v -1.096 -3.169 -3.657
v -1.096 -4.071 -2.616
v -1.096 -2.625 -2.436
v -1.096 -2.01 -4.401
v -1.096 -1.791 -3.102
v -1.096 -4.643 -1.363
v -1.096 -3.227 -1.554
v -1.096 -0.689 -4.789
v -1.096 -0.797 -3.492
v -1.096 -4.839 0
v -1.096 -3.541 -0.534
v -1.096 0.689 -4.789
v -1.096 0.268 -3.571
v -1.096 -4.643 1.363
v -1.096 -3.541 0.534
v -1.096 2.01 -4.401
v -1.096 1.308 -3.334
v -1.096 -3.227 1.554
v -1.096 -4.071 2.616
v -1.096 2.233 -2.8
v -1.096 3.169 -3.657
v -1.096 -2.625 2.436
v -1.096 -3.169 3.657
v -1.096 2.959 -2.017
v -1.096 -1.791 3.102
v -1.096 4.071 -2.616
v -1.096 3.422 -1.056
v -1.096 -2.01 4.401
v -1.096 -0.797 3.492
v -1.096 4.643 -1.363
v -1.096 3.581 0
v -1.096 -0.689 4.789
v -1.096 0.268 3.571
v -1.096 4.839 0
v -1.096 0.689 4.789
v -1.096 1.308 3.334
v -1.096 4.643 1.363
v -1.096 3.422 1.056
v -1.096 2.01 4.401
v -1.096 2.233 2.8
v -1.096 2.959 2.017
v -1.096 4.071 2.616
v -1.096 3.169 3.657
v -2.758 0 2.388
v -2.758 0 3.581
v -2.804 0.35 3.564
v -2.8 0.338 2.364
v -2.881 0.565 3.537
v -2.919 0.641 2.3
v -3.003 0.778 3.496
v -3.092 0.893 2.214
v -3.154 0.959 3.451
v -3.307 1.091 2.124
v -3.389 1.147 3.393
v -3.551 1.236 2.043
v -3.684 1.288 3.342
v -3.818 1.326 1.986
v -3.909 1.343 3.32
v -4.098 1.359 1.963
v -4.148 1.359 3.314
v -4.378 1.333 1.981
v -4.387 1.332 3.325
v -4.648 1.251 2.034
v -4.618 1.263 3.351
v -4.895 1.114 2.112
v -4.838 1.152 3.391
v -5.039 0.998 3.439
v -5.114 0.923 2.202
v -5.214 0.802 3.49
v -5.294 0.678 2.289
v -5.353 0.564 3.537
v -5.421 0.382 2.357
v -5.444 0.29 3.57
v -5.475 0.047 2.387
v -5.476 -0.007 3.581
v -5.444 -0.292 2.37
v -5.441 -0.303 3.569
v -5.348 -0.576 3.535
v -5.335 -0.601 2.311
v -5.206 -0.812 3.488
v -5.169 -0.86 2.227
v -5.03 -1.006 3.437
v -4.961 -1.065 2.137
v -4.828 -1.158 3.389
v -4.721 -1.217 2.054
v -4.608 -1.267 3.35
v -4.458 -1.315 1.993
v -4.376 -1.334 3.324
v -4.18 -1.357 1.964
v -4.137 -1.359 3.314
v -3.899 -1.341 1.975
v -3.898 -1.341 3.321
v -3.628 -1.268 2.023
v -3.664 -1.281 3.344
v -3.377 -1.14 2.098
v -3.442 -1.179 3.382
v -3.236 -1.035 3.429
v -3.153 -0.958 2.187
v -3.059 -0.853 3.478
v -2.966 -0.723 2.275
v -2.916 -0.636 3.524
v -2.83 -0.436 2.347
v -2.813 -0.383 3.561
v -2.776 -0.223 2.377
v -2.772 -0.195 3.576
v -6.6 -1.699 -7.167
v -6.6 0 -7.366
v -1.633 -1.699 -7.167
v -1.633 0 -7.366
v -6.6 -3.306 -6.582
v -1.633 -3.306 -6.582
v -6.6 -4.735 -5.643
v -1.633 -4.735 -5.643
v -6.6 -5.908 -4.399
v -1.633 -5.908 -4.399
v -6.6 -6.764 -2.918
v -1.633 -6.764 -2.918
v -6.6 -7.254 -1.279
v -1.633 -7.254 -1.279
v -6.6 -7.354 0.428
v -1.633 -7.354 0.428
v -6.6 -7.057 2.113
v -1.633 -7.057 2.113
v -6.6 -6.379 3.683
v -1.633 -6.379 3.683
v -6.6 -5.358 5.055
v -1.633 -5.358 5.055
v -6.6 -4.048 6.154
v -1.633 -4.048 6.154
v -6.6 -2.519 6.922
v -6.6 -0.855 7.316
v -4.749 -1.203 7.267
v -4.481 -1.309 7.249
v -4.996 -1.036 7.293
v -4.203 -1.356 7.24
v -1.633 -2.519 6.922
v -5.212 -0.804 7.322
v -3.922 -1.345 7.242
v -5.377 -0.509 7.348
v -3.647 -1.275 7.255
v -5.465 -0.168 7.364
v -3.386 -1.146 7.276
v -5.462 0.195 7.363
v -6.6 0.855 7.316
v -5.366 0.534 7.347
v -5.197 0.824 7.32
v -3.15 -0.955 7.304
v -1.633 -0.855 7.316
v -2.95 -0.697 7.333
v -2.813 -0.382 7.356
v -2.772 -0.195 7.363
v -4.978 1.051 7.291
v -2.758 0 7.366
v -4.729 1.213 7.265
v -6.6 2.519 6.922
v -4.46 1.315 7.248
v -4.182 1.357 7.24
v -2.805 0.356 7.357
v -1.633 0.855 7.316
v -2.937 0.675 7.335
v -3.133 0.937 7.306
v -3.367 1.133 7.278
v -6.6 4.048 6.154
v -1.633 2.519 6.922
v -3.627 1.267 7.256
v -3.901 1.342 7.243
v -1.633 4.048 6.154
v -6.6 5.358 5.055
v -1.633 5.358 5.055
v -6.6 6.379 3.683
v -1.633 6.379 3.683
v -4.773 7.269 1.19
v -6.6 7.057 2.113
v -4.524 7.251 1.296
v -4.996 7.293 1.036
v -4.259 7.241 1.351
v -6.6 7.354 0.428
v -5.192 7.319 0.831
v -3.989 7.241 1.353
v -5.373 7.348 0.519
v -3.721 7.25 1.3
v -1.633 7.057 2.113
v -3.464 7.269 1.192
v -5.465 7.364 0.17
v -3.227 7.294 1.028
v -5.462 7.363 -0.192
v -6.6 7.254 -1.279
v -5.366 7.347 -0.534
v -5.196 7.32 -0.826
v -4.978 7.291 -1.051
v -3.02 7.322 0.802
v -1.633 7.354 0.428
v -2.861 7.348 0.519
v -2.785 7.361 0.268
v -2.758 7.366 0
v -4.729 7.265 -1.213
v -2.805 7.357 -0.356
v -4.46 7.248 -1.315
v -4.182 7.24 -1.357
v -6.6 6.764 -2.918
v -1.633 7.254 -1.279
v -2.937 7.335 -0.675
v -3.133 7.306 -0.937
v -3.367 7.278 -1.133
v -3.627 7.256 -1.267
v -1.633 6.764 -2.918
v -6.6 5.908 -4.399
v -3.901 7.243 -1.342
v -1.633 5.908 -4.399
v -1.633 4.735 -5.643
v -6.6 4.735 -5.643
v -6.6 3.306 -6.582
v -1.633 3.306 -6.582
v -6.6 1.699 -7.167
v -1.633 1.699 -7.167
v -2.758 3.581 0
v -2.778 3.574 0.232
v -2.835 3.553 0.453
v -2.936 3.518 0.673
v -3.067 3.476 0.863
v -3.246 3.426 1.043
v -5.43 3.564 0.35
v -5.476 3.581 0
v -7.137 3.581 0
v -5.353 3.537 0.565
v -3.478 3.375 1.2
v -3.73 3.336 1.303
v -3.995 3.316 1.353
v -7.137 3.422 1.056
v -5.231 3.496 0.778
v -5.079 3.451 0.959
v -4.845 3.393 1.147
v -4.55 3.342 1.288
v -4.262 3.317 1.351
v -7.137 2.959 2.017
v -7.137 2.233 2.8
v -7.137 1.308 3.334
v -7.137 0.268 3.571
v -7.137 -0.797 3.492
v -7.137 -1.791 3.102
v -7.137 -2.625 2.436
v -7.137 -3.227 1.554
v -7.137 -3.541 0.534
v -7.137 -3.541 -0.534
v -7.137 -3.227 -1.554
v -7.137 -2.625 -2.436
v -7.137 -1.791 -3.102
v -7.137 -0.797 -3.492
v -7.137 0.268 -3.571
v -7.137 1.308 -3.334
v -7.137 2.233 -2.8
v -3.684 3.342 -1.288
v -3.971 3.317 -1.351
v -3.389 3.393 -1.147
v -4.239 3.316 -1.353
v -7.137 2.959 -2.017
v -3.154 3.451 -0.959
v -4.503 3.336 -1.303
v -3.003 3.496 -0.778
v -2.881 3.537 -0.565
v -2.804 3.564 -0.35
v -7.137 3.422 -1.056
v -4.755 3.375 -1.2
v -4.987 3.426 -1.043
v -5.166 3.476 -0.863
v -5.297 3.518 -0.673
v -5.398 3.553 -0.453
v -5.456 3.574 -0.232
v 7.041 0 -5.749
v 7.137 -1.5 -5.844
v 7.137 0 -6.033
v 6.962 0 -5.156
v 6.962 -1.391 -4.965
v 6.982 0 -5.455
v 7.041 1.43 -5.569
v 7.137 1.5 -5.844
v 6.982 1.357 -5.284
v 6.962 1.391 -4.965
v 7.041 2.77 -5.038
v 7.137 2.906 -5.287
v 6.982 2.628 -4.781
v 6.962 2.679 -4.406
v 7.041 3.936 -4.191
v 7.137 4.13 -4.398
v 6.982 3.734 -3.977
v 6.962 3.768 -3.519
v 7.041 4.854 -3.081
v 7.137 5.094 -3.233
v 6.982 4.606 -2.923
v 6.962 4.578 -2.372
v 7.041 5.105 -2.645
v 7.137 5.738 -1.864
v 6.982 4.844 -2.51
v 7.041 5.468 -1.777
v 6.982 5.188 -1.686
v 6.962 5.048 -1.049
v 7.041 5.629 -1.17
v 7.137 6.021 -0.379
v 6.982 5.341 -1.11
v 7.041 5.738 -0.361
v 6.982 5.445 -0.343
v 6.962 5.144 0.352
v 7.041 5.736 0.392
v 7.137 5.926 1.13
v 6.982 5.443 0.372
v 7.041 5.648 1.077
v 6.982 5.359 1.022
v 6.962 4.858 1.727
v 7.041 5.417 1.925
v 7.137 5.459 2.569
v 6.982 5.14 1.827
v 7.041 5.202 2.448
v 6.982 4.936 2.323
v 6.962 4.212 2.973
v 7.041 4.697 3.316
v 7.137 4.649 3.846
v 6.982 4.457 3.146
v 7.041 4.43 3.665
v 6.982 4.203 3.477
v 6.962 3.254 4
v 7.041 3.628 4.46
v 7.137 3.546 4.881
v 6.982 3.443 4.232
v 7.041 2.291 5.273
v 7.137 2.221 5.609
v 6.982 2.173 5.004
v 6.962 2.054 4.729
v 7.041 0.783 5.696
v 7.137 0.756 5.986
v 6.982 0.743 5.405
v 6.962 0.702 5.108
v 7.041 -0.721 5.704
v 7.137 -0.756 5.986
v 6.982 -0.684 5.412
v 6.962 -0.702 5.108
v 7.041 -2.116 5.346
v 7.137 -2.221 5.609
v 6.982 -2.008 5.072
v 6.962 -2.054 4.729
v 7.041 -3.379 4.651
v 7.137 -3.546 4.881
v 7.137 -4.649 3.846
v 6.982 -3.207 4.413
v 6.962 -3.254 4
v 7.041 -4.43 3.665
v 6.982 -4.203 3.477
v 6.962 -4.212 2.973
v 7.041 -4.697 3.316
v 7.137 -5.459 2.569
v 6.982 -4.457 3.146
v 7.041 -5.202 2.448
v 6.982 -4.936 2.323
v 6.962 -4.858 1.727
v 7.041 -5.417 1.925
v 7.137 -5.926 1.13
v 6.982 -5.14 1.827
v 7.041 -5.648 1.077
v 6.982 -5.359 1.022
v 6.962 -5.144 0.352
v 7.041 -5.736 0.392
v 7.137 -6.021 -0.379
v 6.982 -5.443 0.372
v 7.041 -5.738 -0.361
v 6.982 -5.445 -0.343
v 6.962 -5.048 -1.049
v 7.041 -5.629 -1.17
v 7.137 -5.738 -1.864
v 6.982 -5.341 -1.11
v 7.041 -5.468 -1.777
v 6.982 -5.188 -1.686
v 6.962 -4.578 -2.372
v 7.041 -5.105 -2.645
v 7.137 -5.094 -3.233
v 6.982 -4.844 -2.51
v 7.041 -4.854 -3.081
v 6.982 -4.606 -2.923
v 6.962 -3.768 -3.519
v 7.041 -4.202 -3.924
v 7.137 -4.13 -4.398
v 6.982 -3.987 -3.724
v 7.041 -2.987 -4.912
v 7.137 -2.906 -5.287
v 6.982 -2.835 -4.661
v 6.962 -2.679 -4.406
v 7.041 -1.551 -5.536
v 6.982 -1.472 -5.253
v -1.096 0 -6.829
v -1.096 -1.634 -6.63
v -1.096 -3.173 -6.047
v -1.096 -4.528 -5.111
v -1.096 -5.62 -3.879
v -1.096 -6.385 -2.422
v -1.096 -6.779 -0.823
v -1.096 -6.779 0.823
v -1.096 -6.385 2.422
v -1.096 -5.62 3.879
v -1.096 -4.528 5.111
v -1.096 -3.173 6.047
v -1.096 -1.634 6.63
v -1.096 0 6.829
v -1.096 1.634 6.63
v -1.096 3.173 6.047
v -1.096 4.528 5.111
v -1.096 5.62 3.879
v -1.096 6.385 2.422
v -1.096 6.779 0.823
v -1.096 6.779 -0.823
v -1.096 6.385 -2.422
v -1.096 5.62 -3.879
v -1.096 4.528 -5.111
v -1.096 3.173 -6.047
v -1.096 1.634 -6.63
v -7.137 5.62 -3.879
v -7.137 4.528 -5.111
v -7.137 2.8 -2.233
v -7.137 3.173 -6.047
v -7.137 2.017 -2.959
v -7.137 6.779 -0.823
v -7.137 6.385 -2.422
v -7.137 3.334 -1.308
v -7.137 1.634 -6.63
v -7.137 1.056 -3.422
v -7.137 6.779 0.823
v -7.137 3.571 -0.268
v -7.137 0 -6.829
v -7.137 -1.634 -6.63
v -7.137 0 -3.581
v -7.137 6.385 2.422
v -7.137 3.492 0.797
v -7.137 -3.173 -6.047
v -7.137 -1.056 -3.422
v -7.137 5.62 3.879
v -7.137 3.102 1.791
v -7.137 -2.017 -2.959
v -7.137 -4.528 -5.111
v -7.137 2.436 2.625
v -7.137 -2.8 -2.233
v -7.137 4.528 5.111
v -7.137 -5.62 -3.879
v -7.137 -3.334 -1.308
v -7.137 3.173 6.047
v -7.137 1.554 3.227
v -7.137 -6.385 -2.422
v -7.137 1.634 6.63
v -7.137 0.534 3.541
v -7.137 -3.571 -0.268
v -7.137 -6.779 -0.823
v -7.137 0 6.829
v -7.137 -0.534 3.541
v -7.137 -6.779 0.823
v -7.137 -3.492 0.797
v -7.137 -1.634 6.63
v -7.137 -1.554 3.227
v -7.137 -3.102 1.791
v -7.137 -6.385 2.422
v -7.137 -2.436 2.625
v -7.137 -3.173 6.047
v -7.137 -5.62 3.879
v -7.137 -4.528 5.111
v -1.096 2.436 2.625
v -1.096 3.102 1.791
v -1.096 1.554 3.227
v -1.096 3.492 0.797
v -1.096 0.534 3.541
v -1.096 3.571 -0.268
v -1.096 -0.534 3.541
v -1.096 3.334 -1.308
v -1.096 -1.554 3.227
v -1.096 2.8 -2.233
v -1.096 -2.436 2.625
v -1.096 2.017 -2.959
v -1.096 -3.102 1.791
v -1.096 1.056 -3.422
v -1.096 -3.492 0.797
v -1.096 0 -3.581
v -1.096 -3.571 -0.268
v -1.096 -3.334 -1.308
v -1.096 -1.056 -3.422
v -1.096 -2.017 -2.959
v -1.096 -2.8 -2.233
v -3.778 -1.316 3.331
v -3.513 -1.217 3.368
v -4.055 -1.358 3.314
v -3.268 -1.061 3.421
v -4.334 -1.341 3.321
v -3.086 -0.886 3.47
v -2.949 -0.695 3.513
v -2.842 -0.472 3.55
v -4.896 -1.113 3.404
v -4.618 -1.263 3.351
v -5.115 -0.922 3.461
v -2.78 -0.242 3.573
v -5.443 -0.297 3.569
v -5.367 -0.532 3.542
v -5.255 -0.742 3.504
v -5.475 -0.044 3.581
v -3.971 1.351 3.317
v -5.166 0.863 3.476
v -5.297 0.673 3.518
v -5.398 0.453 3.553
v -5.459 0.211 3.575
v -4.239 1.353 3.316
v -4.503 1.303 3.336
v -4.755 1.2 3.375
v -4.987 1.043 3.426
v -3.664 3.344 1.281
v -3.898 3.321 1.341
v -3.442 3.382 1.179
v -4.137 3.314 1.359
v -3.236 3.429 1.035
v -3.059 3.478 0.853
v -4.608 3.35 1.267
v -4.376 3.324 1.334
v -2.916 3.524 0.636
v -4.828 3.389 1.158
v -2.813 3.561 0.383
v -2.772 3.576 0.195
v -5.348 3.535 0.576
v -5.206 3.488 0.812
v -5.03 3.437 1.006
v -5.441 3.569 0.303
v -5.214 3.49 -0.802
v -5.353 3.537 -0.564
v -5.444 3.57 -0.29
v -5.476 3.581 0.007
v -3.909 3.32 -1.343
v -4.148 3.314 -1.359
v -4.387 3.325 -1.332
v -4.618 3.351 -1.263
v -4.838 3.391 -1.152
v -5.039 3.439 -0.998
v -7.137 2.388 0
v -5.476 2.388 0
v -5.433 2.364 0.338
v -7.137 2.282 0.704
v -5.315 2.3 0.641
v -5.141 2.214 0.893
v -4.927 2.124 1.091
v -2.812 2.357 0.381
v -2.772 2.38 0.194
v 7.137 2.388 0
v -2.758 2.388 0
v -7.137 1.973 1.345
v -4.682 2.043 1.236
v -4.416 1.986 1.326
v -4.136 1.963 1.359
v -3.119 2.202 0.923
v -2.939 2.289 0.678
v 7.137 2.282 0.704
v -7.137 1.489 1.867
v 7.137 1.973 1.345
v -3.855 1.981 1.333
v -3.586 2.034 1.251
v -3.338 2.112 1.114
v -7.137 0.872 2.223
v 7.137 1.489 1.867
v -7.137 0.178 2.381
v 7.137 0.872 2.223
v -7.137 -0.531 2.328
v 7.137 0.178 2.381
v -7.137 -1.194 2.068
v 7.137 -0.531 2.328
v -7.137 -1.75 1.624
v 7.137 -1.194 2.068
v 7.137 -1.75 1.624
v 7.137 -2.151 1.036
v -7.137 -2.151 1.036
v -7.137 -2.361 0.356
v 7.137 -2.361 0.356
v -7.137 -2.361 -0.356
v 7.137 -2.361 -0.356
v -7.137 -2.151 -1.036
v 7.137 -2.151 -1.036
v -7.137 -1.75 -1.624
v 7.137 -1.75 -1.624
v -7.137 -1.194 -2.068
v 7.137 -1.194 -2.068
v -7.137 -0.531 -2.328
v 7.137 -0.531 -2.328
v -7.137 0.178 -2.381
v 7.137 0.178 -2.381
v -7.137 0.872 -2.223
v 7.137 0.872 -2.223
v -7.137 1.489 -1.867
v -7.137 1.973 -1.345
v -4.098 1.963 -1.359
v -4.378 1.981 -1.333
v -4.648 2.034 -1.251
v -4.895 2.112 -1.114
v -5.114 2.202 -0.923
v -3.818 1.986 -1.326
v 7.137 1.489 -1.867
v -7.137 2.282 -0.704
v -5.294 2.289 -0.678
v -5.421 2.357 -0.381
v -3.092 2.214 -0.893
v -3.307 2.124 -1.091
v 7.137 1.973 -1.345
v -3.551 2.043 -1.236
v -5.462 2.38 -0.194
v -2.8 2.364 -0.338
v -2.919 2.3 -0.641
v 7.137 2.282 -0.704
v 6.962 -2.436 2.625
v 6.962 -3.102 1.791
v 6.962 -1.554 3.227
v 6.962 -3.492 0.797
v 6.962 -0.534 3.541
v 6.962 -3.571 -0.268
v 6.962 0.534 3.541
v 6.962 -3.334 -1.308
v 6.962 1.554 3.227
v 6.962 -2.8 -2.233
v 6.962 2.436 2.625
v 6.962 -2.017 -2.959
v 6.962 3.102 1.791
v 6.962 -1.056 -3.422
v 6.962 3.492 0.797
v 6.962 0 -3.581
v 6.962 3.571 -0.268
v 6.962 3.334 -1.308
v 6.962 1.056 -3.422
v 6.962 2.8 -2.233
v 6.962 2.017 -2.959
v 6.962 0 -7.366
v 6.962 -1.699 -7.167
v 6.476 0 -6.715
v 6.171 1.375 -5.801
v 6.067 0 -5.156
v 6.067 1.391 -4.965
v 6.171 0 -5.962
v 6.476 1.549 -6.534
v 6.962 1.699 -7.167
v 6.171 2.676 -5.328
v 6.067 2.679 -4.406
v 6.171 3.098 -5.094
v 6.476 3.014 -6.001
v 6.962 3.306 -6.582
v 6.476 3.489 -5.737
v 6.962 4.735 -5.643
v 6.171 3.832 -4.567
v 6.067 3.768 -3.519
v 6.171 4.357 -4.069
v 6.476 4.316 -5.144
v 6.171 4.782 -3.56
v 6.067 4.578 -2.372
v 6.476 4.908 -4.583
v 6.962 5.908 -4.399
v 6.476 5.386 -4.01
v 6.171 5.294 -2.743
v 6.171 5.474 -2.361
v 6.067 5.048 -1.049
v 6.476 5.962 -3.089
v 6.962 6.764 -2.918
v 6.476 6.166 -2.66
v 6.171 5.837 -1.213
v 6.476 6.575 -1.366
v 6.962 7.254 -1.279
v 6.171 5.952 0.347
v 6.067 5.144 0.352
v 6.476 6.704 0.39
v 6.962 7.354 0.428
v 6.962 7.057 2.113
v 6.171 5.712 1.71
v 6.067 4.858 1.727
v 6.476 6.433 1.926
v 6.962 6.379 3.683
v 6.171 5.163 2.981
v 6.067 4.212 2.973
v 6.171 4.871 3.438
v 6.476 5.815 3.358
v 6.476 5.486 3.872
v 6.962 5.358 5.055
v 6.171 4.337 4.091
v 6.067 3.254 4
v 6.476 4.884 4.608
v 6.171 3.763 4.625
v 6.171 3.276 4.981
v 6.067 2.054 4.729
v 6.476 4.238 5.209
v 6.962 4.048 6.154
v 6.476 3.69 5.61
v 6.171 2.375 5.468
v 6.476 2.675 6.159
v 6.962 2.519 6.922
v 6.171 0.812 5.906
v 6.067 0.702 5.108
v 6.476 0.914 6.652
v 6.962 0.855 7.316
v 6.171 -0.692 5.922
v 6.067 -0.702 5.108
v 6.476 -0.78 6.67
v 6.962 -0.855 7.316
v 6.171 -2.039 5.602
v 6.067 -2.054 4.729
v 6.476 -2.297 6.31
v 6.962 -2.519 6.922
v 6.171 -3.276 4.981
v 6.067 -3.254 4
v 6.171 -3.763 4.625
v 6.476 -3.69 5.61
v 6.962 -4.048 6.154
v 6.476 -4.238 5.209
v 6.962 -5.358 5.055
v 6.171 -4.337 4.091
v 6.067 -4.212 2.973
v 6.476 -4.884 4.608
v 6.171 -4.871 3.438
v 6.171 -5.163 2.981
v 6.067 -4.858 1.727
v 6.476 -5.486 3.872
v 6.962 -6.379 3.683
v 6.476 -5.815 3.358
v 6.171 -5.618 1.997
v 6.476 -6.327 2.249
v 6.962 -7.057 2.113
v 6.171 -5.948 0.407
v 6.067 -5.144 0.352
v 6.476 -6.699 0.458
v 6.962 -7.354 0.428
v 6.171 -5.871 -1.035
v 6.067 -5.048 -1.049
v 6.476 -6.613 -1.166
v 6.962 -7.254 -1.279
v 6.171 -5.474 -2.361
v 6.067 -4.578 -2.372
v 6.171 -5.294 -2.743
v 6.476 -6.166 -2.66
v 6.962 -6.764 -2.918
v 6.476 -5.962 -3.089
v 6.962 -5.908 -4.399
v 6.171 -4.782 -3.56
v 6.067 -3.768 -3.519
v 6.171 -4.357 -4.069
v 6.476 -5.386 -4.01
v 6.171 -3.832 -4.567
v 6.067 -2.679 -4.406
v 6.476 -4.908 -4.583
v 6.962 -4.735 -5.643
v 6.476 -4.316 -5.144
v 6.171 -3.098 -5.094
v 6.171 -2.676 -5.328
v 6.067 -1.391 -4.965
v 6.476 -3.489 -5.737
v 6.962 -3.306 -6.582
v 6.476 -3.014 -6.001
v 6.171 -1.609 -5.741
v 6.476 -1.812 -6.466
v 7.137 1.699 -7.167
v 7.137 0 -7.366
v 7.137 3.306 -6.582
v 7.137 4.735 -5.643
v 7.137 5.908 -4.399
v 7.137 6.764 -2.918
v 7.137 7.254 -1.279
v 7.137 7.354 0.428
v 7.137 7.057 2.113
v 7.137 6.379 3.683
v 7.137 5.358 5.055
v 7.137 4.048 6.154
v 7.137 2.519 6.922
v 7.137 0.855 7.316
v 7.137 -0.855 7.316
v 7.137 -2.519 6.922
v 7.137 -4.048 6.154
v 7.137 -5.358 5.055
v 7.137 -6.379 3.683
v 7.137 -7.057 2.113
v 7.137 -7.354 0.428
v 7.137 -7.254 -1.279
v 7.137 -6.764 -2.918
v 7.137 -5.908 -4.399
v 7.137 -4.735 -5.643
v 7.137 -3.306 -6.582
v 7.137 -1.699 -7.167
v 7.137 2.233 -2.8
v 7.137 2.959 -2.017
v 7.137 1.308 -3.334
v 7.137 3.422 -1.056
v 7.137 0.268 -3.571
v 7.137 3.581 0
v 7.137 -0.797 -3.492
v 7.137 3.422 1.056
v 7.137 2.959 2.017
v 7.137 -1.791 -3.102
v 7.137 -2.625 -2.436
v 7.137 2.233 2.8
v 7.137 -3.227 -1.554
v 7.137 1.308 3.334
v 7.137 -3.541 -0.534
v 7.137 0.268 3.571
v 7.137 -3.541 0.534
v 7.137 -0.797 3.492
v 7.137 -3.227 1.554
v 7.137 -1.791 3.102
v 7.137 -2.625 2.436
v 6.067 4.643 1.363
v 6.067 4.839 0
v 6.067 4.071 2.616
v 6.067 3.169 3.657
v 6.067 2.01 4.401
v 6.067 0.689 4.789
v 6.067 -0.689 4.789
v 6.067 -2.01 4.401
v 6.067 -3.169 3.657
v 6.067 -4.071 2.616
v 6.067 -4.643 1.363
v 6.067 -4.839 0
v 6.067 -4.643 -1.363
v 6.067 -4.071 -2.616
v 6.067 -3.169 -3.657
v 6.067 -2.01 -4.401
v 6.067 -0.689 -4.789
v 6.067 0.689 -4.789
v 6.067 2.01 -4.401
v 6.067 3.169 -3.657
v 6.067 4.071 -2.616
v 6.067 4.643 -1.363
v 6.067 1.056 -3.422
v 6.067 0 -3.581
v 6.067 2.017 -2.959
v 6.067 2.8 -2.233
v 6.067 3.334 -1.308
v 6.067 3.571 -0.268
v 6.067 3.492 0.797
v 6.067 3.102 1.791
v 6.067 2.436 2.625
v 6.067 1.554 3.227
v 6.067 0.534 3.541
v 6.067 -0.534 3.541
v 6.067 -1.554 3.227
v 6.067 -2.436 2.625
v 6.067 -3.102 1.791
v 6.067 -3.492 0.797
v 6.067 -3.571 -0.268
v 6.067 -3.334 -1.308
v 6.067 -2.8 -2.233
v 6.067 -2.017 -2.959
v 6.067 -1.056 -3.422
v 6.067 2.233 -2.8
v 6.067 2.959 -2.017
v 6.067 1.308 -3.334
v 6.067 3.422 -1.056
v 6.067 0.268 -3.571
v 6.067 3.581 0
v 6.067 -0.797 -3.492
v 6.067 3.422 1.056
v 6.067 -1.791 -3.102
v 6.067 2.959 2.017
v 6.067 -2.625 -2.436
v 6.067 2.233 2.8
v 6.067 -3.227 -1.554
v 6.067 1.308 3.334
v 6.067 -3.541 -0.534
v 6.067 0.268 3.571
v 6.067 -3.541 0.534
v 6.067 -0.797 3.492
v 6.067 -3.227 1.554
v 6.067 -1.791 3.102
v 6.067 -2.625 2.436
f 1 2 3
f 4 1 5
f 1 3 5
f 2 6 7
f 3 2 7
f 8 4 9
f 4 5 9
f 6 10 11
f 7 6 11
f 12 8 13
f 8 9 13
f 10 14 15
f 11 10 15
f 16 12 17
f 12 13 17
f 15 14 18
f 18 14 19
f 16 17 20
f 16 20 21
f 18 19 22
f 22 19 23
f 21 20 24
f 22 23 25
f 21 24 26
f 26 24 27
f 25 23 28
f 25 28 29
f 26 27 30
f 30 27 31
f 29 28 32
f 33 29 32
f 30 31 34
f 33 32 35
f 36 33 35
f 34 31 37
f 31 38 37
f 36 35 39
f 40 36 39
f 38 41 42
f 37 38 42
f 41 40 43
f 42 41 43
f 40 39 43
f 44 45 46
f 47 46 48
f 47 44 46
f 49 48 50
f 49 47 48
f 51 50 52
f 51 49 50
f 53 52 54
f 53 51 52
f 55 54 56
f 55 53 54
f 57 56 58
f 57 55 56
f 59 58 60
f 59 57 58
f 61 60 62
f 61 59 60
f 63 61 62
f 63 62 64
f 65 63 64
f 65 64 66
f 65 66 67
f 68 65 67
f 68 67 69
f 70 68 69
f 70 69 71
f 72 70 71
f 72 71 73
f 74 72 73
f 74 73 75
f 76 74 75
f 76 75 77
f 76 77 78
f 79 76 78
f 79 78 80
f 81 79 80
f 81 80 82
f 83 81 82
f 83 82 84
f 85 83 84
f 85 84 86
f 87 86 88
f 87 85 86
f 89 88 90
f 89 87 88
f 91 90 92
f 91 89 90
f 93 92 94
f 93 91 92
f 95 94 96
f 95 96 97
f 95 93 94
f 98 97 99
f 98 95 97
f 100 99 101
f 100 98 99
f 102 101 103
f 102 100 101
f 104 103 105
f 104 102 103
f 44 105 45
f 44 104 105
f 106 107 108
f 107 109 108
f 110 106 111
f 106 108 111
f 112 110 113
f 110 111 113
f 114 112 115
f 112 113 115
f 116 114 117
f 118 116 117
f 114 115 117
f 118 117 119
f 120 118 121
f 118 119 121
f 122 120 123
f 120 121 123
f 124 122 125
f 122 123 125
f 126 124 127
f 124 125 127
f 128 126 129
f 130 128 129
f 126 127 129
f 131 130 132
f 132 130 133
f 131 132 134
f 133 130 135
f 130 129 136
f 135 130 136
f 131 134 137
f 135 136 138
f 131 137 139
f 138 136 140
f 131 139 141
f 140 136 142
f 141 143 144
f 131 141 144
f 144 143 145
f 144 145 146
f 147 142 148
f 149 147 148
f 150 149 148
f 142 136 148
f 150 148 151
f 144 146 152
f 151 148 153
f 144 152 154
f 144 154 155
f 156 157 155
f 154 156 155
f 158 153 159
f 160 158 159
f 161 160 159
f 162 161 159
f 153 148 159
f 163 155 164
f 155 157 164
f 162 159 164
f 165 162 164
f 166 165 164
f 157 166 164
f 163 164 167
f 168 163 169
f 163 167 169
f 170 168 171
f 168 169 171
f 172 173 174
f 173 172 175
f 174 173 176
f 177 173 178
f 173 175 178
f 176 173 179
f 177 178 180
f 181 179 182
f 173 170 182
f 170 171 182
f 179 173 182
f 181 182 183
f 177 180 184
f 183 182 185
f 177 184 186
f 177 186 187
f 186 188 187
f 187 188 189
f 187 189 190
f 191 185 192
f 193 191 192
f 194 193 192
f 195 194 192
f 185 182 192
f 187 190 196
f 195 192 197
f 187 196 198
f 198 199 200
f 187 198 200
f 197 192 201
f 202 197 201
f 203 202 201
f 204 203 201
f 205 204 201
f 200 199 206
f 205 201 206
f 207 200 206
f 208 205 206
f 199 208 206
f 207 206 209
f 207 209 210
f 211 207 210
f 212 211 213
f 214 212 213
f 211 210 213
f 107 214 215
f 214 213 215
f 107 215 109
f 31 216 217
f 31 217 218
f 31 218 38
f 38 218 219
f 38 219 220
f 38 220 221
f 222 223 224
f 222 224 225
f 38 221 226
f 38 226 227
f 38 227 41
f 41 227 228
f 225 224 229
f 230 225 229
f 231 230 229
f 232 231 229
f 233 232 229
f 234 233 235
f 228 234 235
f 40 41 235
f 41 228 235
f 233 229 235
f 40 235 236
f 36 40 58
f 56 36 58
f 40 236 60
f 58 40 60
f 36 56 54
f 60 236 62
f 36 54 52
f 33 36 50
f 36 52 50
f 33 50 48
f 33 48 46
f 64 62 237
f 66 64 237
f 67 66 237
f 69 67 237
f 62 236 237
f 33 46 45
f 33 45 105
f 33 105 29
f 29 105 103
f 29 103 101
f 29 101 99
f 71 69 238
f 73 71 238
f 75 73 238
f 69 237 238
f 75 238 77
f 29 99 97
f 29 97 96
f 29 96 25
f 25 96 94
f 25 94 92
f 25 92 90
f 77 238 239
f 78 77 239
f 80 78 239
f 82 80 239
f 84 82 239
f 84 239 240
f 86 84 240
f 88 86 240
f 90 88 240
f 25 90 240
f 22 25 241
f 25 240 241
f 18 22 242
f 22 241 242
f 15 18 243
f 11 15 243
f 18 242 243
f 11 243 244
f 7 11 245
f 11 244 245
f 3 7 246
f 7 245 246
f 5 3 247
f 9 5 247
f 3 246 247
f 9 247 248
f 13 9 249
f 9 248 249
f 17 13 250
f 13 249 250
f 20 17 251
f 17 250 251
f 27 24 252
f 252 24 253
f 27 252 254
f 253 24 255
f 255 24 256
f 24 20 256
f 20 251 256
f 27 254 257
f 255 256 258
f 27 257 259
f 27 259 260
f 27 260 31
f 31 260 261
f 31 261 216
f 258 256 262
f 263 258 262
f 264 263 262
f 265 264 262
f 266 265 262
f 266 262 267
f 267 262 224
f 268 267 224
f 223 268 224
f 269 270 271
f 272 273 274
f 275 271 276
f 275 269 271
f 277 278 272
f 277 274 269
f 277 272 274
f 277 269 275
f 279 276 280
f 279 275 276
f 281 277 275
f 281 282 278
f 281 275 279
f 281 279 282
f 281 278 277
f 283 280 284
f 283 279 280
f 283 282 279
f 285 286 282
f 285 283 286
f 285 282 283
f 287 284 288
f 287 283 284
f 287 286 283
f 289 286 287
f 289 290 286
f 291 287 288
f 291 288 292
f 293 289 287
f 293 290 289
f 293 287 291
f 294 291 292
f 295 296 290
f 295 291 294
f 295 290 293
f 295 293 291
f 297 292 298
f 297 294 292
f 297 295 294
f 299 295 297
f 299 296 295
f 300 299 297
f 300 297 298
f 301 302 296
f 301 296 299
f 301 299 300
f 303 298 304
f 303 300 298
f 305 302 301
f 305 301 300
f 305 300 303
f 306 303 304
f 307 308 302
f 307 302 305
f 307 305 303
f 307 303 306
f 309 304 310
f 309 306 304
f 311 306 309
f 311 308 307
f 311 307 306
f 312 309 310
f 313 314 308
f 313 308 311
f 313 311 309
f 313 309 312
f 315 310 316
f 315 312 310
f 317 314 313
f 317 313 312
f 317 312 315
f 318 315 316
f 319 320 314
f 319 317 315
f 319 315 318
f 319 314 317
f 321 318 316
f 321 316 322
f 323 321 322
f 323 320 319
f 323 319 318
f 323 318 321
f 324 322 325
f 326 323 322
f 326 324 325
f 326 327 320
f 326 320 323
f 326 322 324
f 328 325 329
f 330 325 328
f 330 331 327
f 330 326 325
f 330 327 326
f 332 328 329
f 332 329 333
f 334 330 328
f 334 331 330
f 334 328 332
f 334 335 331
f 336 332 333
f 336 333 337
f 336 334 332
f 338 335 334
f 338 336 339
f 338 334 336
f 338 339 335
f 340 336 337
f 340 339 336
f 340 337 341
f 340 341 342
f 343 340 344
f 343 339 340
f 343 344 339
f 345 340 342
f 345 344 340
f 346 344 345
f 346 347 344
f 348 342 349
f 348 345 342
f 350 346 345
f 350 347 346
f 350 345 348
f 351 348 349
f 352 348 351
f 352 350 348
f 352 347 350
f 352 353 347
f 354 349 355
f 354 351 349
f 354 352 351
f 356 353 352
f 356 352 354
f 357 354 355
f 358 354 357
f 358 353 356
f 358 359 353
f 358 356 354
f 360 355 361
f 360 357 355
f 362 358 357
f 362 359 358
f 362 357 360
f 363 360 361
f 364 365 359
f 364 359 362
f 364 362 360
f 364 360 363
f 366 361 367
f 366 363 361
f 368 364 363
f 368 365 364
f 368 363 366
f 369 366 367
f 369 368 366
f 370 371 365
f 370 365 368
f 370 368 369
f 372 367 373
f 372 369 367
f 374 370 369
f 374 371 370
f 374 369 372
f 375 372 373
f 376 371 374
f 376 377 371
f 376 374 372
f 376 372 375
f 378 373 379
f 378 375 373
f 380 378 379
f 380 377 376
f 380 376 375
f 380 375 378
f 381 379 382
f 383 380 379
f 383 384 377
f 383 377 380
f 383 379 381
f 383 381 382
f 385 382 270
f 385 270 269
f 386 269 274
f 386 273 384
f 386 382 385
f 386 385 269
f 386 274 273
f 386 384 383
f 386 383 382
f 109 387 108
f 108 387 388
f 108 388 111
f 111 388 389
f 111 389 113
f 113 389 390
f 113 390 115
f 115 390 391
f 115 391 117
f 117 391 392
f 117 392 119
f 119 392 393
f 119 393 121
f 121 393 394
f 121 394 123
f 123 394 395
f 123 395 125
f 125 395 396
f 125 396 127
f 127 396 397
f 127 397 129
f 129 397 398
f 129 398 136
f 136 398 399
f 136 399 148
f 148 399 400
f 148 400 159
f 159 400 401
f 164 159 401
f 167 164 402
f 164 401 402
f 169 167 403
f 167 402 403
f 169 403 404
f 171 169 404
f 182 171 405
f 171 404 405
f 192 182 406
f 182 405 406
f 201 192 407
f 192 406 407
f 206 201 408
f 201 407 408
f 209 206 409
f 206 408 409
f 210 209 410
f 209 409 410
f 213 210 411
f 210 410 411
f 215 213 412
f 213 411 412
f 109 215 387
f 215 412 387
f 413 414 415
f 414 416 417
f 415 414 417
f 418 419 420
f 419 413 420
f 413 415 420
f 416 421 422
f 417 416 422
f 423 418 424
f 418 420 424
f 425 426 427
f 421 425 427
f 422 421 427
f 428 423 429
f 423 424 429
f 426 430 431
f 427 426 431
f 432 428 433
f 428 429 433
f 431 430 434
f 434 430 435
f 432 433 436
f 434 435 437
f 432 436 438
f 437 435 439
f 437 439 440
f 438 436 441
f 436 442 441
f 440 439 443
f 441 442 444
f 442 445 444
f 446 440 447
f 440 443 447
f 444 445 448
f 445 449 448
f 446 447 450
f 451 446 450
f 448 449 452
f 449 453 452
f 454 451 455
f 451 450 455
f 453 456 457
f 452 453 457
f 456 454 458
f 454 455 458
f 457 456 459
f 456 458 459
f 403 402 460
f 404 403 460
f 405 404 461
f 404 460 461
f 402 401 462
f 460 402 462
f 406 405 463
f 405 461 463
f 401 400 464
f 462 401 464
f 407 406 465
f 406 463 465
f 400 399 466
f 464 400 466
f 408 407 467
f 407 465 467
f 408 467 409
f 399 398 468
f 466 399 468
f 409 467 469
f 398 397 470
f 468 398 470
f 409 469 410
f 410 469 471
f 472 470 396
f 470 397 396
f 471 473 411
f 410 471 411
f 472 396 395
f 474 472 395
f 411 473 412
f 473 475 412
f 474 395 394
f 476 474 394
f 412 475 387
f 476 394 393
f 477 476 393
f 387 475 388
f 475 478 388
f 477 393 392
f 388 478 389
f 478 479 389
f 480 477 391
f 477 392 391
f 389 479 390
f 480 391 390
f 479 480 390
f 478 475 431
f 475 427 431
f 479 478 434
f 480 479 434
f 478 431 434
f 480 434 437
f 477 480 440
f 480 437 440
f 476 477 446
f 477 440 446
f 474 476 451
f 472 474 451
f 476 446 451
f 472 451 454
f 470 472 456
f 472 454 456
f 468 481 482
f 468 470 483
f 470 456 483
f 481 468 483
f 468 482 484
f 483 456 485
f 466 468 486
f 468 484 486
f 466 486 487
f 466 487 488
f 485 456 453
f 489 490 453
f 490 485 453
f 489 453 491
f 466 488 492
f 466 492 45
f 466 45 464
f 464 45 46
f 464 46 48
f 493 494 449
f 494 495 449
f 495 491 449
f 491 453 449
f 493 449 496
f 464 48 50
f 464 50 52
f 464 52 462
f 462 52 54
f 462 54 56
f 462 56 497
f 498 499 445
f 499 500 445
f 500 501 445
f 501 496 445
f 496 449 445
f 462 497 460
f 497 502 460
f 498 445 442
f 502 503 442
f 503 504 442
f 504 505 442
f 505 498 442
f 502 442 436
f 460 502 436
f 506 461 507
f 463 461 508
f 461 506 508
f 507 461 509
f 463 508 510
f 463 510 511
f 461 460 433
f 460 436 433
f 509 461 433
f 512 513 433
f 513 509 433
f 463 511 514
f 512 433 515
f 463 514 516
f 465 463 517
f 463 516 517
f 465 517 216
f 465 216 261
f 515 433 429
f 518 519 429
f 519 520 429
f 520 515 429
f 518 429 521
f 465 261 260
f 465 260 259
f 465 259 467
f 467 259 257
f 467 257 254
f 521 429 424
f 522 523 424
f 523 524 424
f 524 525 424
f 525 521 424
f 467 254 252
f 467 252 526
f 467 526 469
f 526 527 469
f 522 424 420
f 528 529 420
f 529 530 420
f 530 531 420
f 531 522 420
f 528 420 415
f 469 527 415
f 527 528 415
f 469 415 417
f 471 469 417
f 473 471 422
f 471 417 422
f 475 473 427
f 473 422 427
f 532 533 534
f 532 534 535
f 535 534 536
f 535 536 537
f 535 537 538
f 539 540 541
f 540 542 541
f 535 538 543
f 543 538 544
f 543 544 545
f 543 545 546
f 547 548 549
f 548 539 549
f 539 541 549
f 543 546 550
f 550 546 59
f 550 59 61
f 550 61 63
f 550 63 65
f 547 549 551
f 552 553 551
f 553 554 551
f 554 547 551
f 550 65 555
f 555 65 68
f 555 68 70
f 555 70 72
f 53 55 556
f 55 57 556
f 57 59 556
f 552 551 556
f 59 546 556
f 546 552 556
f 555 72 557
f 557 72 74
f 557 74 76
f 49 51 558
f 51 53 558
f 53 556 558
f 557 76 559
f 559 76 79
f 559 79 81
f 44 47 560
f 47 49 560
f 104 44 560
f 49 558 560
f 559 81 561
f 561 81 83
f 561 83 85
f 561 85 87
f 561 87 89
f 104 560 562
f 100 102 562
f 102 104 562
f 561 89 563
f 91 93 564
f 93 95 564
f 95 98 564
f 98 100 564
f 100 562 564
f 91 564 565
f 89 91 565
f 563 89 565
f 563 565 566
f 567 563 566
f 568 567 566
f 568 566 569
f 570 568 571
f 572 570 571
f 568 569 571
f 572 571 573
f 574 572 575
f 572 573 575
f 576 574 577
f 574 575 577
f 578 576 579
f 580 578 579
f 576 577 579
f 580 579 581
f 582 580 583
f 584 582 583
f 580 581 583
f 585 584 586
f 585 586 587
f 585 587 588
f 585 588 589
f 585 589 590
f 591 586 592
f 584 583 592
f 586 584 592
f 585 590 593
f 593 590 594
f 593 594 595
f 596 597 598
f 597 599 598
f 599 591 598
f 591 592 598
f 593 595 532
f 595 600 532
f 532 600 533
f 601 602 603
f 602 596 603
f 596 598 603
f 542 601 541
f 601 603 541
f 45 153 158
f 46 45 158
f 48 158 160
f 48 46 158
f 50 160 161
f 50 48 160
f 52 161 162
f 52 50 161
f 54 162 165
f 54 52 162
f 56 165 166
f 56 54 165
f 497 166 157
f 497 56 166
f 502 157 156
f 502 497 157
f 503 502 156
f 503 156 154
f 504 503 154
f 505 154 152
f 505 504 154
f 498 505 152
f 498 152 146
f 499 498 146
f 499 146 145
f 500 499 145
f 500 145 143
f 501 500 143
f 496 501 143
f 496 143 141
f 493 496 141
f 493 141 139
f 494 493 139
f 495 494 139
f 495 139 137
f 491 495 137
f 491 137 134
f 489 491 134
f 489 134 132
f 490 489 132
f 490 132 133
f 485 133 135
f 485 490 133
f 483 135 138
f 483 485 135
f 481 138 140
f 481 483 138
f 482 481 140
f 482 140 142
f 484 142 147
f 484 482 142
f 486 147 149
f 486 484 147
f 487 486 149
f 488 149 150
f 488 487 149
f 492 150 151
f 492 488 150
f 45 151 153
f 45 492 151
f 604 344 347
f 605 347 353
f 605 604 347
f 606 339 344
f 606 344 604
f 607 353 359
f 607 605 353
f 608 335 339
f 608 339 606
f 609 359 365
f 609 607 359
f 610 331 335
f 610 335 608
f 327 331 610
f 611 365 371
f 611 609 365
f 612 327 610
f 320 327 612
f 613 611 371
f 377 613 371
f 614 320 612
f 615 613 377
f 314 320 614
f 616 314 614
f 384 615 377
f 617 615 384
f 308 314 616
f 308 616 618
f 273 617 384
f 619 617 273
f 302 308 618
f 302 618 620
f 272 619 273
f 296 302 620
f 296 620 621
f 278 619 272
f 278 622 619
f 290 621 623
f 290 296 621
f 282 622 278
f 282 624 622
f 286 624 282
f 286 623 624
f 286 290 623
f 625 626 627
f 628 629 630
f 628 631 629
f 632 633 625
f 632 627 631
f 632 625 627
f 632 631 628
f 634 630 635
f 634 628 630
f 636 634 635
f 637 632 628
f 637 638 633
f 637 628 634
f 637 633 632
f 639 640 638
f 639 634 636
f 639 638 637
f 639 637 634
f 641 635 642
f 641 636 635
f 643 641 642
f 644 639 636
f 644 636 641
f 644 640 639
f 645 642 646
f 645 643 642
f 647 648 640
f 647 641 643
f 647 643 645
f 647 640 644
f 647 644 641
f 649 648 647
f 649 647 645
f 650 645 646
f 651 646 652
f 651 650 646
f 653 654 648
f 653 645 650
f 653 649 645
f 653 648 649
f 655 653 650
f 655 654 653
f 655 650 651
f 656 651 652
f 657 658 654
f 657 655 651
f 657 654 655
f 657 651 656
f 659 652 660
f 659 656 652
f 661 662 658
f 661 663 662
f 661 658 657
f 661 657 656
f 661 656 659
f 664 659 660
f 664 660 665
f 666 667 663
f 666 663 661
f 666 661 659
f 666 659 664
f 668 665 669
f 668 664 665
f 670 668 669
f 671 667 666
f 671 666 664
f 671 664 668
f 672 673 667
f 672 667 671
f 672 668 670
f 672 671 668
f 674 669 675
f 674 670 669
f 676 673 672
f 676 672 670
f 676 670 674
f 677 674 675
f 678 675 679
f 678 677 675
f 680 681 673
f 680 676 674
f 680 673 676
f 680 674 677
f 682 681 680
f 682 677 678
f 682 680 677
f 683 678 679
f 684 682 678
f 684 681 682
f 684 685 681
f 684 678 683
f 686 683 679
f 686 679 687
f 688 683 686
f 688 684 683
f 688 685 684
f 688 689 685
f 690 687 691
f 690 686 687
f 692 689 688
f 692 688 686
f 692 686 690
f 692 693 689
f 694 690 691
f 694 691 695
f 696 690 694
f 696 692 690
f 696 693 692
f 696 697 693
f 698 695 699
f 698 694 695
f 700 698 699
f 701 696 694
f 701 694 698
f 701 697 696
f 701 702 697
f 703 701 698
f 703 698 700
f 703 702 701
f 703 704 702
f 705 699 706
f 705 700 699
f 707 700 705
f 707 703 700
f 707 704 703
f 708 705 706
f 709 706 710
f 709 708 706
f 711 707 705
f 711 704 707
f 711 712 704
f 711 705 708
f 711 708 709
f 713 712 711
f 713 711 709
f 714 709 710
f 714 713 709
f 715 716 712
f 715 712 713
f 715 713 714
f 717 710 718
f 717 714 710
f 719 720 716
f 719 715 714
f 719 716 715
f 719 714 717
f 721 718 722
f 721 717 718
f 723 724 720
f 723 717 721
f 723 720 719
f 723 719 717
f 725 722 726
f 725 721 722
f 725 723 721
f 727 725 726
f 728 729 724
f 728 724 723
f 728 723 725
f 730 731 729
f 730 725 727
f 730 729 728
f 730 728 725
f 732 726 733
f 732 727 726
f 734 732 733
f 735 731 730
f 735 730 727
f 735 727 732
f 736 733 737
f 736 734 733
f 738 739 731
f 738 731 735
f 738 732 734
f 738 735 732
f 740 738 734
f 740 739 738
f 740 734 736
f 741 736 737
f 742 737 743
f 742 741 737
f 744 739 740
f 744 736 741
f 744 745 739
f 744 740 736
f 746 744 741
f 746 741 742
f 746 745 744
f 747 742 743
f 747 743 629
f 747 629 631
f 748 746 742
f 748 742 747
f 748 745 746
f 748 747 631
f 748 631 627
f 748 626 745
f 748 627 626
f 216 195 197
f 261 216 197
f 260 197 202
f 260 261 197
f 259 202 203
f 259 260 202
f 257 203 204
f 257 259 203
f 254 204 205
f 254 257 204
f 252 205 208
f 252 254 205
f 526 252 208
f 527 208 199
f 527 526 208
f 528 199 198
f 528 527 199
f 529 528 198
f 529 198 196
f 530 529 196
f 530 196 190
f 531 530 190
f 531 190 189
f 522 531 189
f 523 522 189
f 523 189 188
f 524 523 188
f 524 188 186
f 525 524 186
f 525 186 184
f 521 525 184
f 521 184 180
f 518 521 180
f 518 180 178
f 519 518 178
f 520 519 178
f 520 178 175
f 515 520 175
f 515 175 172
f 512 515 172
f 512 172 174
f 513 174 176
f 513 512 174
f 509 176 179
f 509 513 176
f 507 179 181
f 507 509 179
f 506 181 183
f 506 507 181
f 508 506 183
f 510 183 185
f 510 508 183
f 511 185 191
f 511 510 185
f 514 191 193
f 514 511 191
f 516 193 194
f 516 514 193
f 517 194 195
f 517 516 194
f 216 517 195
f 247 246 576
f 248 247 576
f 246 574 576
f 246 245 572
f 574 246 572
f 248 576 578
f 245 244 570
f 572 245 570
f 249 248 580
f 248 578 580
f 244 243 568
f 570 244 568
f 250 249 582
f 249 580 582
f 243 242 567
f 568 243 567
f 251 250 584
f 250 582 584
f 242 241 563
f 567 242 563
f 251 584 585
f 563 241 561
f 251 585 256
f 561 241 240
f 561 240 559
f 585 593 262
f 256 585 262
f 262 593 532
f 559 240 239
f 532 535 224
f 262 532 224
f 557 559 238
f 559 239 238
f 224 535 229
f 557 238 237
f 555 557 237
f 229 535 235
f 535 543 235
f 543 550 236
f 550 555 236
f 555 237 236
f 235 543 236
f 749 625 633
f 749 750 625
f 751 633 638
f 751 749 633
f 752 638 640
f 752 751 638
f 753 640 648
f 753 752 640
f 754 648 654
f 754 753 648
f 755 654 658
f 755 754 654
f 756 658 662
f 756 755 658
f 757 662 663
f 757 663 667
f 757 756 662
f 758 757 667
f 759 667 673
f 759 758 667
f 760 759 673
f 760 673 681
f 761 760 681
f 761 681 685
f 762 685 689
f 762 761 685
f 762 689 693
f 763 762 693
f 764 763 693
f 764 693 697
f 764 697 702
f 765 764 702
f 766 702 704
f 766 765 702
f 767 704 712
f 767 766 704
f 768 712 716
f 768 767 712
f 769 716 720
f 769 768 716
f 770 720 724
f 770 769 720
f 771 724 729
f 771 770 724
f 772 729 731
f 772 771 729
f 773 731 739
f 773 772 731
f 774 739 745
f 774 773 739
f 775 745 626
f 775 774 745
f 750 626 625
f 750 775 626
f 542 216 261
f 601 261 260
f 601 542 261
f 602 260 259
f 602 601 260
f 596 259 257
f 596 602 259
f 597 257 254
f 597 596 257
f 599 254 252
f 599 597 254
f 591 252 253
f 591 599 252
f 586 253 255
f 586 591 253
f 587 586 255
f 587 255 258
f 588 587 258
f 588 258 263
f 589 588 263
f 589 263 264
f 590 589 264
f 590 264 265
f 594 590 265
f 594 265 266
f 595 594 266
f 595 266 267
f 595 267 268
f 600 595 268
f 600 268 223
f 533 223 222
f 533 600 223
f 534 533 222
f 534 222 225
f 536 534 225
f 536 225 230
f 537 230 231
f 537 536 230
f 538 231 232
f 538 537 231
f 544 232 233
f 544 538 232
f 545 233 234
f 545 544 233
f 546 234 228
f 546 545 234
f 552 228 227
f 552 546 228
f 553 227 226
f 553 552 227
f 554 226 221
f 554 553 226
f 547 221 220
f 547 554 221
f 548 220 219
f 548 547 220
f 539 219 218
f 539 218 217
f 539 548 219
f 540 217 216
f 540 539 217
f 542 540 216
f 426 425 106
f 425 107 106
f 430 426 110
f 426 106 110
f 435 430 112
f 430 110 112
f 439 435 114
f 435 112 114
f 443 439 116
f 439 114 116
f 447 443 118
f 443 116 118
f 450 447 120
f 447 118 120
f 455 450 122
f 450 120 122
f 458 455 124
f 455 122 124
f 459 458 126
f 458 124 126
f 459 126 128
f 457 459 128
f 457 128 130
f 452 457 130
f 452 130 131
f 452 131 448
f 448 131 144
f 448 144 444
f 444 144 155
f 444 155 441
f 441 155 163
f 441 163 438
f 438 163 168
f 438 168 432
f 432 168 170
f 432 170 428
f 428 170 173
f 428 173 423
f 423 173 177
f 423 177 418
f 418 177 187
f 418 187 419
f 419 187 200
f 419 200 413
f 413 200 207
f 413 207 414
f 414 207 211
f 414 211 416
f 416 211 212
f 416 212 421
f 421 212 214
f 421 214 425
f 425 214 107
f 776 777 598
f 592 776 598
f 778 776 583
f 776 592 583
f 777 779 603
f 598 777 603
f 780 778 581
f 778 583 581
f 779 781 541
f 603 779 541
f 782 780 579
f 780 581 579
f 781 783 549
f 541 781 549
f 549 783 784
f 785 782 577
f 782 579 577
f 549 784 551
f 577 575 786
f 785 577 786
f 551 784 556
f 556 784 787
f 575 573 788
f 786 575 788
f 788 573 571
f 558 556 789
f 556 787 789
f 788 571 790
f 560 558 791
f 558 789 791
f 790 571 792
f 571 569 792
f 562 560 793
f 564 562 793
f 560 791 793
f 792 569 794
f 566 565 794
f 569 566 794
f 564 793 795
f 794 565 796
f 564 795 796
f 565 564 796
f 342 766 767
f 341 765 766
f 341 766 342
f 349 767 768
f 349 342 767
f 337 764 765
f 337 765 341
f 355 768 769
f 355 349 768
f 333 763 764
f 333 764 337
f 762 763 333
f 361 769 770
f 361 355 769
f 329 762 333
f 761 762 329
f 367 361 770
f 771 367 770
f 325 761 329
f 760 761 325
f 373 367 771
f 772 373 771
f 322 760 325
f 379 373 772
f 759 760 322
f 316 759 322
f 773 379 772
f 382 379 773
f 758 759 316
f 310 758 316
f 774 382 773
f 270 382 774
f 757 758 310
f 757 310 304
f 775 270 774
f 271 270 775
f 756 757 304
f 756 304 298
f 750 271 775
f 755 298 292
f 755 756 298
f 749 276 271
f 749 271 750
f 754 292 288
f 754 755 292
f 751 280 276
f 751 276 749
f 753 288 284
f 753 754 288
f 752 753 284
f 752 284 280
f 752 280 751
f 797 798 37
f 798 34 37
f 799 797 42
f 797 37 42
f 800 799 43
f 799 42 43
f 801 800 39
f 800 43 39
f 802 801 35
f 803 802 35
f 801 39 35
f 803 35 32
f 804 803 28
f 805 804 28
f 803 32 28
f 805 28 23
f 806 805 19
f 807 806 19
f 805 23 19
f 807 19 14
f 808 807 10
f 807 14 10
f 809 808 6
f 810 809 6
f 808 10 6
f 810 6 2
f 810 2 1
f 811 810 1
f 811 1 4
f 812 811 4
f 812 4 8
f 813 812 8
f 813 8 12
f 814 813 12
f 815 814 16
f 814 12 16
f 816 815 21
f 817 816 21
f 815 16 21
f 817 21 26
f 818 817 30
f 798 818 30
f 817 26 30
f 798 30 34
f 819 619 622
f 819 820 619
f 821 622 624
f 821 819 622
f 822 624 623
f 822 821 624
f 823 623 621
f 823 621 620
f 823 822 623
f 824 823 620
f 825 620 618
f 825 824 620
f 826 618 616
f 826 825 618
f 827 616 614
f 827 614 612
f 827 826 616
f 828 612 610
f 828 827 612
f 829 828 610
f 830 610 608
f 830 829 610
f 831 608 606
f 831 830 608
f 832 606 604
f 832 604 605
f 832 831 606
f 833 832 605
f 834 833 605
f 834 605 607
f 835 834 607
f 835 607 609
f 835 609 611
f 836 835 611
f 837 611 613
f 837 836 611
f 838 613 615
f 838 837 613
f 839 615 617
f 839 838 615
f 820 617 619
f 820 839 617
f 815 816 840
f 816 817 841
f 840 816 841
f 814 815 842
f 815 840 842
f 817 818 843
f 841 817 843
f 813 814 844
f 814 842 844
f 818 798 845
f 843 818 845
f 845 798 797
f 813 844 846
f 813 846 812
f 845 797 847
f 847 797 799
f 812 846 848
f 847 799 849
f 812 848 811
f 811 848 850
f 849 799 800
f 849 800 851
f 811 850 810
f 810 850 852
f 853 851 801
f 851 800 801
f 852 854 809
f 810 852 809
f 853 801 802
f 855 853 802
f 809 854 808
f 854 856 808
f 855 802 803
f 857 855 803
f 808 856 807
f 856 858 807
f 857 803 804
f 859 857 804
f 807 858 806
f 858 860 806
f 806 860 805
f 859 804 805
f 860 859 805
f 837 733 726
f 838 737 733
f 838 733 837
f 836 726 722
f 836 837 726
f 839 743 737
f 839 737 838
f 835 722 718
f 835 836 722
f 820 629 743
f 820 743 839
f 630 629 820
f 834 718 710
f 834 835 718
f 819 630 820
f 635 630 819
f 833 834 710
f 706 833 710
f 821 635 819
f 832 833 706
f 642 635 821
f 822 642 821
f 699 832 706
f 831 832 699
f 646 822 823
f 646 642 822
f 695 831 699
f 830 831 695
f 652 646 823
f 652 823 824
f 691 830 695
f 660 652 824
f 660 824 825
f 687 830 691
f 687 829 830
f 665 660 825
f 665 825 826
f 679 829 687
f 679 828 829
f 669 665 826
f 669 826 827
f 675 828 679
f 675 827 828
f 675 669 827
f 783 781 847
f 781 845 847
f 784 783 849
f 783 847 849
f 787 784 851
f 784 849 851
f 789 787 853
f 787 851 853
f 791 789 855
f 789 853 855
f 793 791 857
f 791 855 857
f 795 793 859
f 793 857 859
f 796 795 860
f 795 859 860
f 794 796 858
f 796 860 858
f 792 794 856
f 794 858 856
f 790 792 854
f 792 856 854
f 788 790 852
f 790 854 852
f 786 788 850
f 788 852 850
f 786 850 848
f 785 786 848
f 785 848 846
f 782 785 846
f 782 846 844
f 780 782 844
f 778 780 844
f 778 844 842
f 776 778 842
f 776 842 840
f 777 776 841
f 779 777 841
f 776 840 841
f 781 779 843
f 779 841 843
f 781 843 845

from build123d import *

# Parameters (mm, degrees)
SKETCH5_R         = 1.3589
SET_SCREWS_DEPTH  = 10
CIRPATTERN1_COUNT = 2
CIRPATTERN1_ANGLE = 90


with BuildPart() as part:
    # Sketch2 → Base Body (revolve)
    with BuildSketch(Plane.XY):
        Polygon((-7.1374, 2.3876), (7.1374, 2.3876), (7.1374, 3.5814), (6.06679, 3.5814), (6.06679, 4.8387), (-1.09601, 4.8387), (-1.09601, 3.5814), (-7.1374, 3.5814), align=None)
    revolve(axis=Axis((-7.1374, 0, 0), (1, 0, 0)))


with BuildPart() as body_2:
    # Sketch3 → Hub (revolve)
    with BuildSketch(Plane(origin=(0, 0, 0), x_dir=(1, 0, 0), z_dir=(0, 1, 0))):
        Polygon((-1.09601, 3.5814), (-7.1374, 3.5814), (-7.1374, 6.82879), (-6.60019, 7.366), (-1.63322, 7.366), (-1.09601, 6.82879), align=None)
    revolve(axis=Axis((0, 0, 0), (-1, 0, 0)))


with BuildPart() as body_3:
    # Sketch4 → Flange (revolve)
    with BuildSketch(Plane(origin=(0, 0, 0), x_dir=(1, 0, 0), z_dir=(0, 1, 0))):
        with BuildLine():
            Line((6.06679, 3.5814), (6.06679, 5.1562))
            ThreePointArc((6.06679, 5.1562), (6.299092689, 6.34832312), (6.962007344, 7.366))
            Line((6.962007344, 7.366), (7.1374, 7.366))
            Line((7.1374, 7.366), (7.1374, 6.033098904))
            ThreePointArc((7.1374, 6.033098904), (7.006285495, 5.603333725), (6.962007344, 5.1562))
            Line((6.962007344, 5.1562), (6.962007344, 3.5814))
            Line((6.962007344, 3.5814), (6.06679, 3.5814))
        make_face()
    revolve(axis=Axis((0, 0, 0), (1, 0, 0)))


with BuildPart() as set_screws_tool:
    # Sketch5 → Set Screws (new body)
    with BuildSketch(Plane(origin=(0, 0, 0), x_dir=(1, 0, 0), z_dir=(0, 1, 0))):
        with Locations((-4.116705, 0)):
            Circle(SKETCH5_R)
    set_screws = extrude(amount=SET_SCREWS_DEPTH)


with BuildPart() as part_1:
    add(part.part)

    # Set Screws: cut by set_screws_tool
    add(set_screws_tool.part, mode=Mode.SUBTRACT)


with BuildPart() as body_2_1:
    add(body_2.part)

    # Set Screws: cut by set_screws_tool
    add(set_screws_tool.part, mode=Mode.SUBTRACT)


with BuildPart() as cirpattern1_tool:
    # CirPattern1: Set Screws ×2 about axis
    cirpattern1_axis = Axis((-7.1374, 0, 0), (1, 0, 0))
    for i in range(1, CIRPATTERN1_COUNT):
        add(set_screws.rotate(cirpattern1_axis, i * CIRPATTERN1_ANGLE / (CIRPATTERN1_COUNT - 1)))


with BuildPart() as part_2:
    add(part_1.part)

    # CirPattern1: cut by cirpattern1_tool
    add(cirpattern1_tool.part, mode=Mode.SUBTRACT)


with BuildPart() as body_2_2:
    add(body_2_1.part)

    # CirPattern1: cut by cirpattern1_tool
    add(cirpattern1_tool.part, mode=Mode.SUBTRACT)


solid = Compound([body_3.part, part_2.part, body_2_2.part])
